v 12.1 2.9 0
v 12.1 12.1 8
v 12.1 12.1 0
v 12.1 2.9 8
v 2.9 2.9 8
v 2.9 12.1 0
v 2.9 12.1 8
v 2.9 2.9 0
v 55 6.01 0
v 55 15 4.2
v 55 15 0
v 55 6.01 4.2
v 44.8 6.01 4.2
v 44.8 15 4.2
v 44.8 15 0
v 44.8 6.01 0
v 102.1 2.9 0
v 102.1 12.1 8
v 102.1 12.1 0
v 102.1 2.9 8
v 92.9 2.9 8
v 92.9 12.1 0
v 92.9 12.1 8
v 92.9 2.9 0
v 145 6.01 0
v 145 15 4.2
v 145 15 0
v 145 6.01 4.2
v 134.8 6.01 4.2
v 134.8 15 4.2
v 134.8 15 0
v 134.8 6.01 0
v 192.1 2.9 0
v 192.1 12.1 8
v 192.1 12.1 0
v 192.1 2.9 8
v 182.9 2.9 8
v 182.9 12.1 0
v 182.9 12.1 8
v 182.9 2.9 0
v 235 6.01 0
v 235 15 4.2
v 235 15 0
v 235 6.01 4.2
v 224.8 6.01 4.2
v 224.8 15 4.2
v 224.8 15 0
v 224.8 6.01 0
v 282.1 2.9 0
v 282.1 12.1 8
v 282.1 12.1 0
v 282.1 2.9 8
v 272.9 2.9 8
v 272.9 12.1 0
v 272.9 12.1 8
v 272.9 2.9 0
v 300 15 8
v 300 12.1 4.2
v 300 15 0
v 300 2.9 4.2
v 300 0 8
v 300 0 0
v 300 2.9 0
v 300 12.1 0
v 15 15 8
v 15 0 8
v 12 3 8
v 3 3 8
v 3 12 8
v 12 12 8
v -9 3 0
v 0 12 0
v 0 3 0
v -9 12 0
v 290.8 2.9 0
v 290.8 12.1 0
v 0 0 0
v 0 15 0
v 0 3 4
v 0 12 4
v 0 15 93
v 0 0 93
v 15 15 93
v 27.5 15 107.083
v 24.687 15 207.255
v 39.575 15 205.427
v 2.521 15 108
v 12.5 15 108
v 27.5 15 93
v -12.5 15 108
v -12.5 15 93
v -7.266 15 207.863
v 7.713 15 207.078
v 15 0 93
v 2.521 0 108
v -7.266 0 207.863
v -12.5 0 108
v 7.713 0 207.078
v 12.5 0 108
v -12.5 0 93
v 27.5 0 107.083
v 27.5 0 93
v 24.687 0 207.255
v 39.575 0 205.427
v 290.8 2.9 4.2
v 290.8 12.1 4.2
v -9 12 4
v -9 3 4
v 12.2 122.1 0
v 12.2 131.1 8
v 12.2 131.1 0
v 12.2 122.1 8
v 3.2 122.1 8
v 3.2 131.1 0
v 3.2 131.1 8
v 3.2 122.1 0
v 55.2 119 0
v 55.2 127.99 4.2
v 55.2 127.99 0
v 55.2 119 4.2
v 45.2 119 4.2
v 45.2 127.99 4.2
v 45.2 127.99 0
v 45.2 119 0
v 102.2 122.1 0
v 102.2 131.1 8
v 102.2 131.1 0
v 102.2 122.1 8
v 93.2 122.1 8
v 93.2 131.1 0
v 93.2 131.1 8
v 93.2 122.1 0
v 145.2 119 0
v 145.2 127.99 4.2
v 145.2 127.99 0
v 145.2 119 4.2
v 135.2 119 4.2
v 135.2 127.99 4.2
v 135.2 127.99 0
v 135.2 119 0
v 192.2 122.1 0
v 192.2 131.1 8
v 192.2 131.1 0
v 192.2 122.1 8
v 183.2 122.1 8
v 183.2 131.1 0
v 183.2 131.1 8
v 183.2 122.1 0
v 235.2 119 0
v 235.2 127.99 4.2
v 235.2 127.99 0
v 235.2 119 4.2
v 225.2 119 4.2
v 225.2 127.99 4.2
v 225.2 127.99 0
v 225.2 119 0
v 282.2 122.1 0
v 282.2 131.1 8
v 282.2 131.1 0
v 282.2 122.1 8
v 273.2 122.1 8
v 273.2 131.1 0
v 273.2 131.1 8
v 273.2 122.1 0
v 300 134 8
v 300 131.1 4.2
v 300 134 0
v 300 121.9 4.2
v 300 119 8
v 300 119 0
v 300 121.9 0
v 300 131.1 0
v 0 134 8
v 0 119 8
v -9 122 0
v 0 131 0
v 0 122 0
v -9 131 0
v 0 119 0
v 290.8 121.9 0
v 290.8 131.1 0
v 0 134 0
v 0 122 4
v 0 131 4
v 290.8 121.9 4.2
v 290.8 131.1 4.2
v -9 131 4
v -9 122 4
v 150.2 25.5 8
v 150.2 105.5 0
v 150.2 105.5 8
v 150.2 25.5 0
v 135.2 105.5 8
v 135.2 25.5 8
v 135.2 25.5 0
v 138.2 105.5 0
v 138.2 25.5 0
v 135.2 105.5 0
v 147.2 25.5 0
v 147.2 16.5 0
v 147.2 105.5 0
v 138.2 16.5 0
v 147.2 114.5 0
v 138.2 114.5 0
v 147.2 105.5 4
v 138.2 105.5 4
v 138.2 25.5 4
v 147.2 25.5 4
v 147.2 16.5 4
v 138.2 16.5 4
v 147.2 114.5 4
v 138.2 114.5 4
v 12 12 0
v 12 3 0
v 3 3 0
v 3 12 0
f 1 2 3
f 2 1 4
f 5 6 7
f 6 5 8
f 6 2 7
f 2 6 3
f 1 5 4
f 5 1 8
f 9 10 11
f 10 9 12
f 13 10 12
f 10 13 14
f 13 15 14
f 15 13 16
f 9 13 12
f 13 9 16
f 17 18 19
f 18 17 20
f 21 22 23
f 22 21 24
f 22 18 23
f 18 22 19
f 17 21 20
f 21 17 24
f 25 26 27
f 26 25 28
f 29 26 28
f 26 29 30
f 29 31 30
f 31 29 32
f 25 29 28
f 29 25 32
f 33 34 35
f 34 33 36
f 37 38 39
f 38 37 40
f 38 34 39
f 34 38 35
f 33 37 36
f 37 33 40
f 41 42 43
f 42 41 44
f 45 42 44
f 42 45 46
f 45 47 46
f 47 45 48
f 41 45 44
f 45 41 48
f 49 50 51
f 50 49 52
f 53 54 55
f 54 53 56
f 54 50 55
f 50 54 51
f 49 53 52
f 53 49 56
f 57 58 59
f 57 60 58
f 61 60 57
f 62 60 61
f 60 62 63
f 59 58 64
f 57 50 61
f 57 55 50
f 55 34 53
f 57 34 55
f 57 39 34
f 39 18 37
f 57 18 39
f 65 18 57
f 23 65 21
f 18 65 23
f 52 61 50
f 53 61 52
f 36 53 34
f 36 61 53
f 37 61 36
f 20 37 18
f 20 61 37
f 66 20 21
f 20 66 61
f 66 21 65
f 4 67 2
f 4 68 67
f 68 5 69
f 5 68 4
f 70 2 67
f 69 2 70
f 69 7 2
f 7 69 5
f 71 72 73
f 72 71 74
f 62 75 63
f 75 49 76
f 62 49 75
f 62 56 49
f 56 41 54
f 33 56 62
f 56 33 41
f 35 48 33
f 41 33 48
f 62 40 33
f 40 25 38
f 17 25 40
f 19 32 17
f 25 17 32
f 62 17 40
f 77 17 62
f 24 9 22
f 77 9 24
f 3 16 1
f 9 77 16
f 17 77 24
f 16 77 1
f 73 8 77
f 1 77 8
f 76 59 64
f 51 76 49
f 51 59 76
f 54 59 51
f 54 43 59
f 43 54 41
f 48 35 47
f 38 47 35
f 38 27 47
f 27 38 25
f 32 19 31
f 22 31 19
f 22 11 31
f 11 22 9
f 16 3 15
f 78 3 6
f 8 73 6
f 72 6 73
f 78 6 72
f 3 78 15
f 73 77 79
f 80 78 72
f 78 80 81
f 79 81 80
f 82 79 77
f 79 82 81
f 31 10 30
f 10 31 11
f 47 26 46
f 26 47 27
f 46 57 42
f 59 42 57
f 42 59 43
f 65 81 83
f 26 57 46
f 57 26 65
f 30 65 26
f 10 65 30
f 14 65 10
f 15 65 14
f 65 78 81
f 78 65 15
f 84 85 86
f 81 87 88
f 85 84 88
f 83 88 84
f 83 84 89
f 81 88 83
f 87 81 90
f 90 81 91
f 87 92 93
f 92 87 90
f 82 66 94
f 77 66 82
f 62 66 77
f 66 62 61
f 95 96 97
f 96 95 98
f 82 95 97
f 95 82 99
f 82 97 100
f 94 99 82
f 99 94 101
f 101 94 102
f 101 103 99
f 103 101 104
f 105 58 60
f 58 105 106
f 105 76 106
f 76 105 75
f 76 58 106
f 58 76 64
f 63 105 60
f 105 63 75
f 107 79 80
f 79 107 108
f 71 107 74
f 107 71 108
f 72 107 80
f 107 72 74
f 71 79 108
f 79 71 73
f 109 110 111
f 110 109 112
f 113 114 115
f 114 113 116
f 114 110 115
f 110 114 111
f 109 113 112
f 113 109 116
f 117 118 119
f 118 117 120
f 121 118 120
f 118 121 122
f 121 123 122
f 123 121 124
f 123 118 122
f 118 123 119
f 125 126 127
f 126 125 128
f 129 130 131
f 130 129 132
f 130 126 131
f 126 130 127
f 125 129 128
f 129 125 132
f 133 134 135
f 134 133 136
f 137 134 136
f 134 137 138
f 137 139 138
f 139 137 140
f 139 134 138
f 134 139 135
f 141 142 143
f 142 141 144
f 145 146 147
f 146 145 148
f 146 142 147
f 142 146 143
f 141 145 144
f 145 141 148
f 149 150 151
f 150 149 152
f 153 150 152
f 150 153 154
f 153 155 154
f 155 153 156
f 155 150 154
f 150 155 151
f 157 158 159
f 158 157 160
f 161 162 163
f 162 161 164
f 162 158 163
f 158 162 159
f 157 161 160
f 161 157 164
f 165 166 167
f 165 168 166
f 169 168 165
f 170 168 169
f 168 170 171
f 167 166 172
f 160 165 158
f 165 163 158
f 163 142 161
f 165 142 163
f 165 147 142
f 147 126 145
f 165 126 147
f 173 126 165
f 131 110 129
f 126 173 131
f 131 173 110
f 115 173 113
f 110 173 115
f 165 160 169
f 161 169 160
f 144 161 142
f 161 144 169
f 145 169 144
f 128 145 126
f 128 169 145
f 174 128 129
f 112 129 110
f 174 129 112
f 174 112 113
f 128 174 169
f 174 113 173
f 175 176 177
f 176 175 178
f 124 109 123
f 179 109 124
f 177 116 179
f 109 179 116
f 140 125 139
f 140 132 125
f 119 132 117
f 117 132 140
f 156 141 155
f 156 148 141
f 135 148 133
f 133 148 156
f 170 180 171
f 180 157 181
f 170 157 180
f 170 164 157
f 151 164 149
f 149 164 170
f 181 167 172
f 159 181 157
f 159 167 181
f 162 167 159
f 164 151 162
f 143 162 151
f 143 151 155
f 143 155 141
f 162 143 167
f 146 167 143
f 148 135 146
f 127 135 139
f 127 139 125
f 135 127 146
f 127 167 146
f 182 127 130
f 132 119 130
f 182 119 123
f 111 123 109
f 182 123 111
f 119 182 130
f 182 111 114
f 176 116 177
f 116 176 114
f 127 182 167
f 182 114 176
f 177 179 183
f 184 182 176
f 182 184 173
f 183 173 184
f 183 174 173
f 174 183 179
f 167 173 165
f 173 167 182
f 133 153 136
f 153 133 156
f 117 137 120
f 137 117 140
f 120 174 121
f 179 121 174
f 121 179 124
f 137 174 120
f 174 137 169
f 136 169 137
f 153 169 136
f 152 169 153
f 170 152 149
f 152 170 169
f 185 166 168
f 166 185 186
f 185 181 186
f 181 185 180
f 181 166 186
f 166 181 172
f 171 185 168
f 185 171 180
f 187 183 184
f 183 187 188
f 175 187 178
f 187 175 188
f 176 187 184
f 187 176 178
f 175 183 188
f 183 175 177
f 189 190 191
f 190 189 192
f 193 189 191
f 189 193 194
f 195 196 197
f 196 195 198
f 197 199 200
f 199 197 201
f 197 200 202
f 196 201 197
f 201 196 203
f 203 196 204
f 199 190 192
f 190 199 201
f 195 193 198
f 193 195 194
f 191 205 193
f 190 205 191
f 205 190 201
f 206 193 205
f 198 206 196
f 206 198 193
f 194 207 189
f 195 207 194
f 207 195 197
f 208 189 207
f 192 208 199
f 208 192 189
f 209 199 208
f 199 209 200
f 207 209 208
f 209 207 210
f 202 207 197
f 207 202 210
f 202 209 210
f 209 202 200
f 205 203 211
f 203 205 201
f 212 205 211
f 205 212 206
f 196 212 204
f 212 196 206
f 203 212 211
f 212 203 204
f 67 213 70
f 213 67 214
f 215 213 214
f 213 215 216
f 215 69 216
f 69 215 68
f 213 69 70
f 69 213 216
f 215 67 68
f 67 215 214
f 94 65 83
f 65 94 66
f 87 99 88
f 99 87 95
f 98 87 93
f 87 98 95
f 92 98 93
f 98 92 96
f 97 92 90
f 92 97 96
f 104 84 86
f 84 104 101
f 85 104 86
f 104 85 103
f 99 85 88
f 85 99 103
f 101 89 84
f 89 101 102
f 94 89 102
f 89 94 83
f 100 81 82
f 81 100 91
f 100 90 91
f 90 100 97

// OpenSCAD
rail_len = 300;
rail_wid = 15;
rail_hei = 8;
quad_distance = 90;
number_of_quads = rail_len / quad_distance;
nupsi_offset = 6;
nupsi = rail_wid - nupsi_offset;
stecker_hei = rail_hei / 2;
stem_hei=100;
arm_dist = 10;
quer_len = 80;

show_rail_left=true;
show_rail_right=true;
show_stecker=true;
show_stand=true;

if (show_rail_right)
{
    // bottom rail right
    difference()
    {
        cube([rail_len, rail_wid, rail_hei]);
        for (dist = [0 : 1 : number_of_quads])
        {
            translate([nupsi_offset/2 + (dist * quad_distance) -0.1,(nupsi_offset - 0.2)/2,-1])
            cube([nupsi+0.2,nupsi+0.2,rail_hei+2]);

            translate([quad_distance/2 + (dist * quad_distance) - 0.2 , nupsi_offset + 0.01, -1])
            cube([nupsi+1.2, nupsi+0.2, stecker_hei+1.2]);
        }
        translate([rail_len - nupsi -0.2, (nupsi_offset - 0.2)/2 , -1])
        cube([nupsi+1.2, nupsi + 0.2, stecker_hei+1.2]);
    }
    translate([-nupsi, nupsi_offset/2, 0])
    cube([nupsi, nupsi, stecker_hei]);
}

if (show_rail_left)
{
    // bottom rail left
    translate([0,quer_len+2*(rail_wid + nupsi/2),0])
    {
    difference()
    {
        cube([rail_len, rail_wid, rail_hei]);
        for (dist = [0 : 1 : number_of_quads])
        {
            translate([nupsi_offset/2 + (dist * quad_distance) +0.2,(nupsi_offset +0.2)/2,-1])
            cube([nupsi,nupsi,rail_hei+2]);

            translate([quad_distance/2 + (dist * quad_distance) +0.2 , - 0.01, -1])
            cube([nupsi+1, nupsi, stecker_hei+1.2]);
        }
        translate([rail_len - nupsi -0.2, (nupsi_offset - 0.2)/2 , -1])
        cube([nupsi+1, nupsi +0.2, stecker_hei+1.2]);
    }
    translate([-nupsi, nupsi_offset/2, 0])
    cube([nupsi, nupsi, stecker_hei]);
    }
}

if (show_stecker)
{
    // querbalken
    translate([quad_distance/2 + quad_distance +0.2,rail_wid/2 + 2*nupsi,0])
    {
        cube([rail_wid, quer_len, rail_hei]);
        translate([nupsi_offset/2, -nupsi, 0])
        cube([nupsi, nupsi, stecker_hei]);
        translate([nupsi_offset/2, quer_len, 0])
        cube([nupsi, nupsi, stecker_hei]);
    }
}

if (show_stand)
{
    // stand
    translate([nupsi_offset/2, nupsi_offset/2,0])
    cube([nupsi,nupsi,rail_hei]);
    translate([0,0,rail_hei])
    cube([rail_wid, rail_wid, stem_hei]);

    translate([-(rail_wid/2 + arm_dist/2),0,rail_hei + stem_hei])
    rotate([0,3,0])
    cube([rail_wid, rail_wid, stem_hei]);
    translate([(rail_wid + arm_dist)/2,0,rail_hei + stem_hei])
    rotate([0,7,0])
    cube([rail_wid, rail_wid, stem_hei]);
    translate([-(rail_wid + arm_dist)/2,0,stem_hei+rail_hei - rail_wid])
    cube([rail_wid *2 + arm_dist, rail_wid, rail_wid]);
}
